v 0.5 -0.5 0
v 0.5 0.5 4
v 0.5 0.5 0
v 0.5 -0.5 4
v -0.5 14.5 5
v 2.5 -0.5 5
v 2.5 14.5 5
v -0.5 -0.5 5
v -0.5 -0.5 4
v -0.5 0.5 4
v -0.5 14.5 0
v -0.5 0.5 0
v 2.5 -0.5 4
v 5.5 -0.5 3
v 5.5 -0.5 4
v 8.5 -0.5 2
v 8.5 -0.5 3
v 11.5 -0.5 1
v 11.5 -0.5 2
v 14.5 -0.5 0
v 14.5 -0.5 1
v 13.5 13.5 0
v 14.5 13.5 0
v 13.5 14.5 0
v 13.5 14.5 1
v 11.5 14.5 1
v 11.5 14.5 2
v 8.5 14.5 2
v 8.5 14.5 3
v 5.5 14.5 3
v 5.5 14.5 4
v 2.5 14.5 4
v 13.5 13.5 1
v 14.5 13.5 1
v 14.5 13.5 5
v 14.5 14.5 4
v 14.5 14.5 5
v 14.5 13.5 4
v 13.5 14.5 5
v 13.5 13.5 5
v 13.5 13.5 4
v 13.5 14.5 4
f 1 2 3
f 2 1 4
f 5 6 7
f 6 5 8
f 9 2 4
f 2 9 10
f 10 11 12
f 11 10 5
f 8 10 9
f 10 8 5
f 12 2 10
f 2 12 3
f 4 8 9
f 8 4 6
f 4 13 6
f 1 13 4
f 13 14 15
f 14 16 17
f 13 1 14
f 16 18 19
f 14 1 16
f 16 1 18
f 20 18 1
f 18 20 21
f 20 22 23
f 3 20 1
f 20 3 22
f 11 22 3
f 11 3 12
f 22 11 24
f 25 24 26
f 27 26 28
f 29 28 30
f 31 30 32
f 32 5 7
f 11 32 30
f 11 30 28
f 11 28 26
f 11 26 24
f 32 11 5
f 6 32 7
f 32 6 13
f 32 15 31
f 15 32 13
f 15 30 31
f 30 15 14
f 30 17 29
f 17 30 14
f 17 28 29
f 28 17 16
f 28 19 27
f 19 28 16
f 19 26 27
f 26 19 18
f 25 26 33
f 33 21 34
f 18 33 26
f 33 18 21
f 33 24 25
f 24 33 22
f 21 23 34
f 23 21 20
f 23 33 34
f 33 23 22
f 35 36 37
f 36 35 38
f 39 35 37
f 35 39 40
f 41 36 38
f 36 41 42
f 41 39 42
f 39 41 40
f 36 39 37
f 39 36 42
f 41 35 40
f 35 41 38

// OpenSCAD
union() {
    translate([0, 0, 4.5]) color([1, 0, 0]) cube([1, 1, 1], center=true);
    translate([0, 1, 2.5]) cube([1, 1, 5], center=true);
    translate([0, 2, 2.5]) cube([1, 1, 5], center=true);
    translate([0, 3, 2.5]) cube([1, 1, 5], center=true);
    translate([0, 4, 2.5]) cube([1, 1, 5], center=true);
    translate([0, 5, 2.5]) cube([1, 1, 5], center=true);
    translate([0, 6, 2.5]) cube([1, 1, 5], center=true);
    translate([0, 7, 2.5]) cube([1, 1, 5], center=true);
    translate([0, 8, 2.5]) cube([1, 1, 5], center=true);
    translate([0, 9, 2.5]) cube([1, 1, 5], center=true);
    translate([0, 10, 2.5]) cube([1, 1, 5], center=true);
    translate([0, 11, 2.5]) cube([1, 1, 5], center=true);
    translate([0, 12, 2.5]) cube([1, 1, 5], center=true);
    translate([0, 13, 2.5]) cube([1, 1, 5], center=true);
    translate([0, 14, 2.5]) cube([1, 1, 5], center=true);
    translate([1, 0, 2.5]) cube([1, 1, 5], center=true);
    translate([1, 1, 2.5]) cube([1, 1, 5], center=true);
    translate([1, 2, 2.5]) cube([1, 1, 5], center=true);
    translate([1, 3, 2.5]) cube([1, 1, 5], center=true);
    translate([1, 4, 2.5]) cube([1, 1, 5], center=true);
    translate([1, 5, 2.5]) cube([1, 1, 5], center=true);
    translate([1, 6, 2.5]) cube([1, 1, 5], center=true);
    translate([1, 7, 2.5]) cube([1, 1, 5], center=true);
    translate([1, 8, 2.5]) cube([1, 1, 5], center=true);
    translate([1, 9, 2.5]) cube([1, 1, 5], center=true);
    translate([1, 10, 2.5]) cube([1, 1, 5], center=true);
    translate([1, 11, 2.5]) cube([1, 1, 5], center=true);
    translate([1, 12, 2.5]) cube([1, 1, 5], center=true);
    translate([1, 13, 2.5]) cube([1, 1, 5], center=true);
    translate([1, 14, 2.5]) cube([1, 1, 5], center=true);
    translate([2, 0, 2.5]) cube([1, 1, 5], center=true);
    translate([2, 1, 2.5]) cube([1, 1, 5], center=true);
    translate([2, 2, 2.5]) cube([1, 1, 5], center=true);
    translate([2, 3, 2.5]) cube([1, 1, 5], center=true);
    translate([2, 4, 2.5]) cube([1, 1, 5], center=true);
    translate([2, 5, 2.5]) cube([1, 1, 5], center=true);
    translate([2, 6, 2.5]) cube([1, 1, 5], center=true);
    translate([2, 7, 2.5]) cube([1, 1, 5], center=true);
    translate([2, 8, 2.5]) cube([1, 1, 5], center=true);
    translate([2, 9, 2.5]) cube([1, 1, 5], center=true);
    translate([2, 10, 2.5]) cube([1, 1, 5], center=true);
    translate([2, 11, 2.5]) cube([1, 1, 5], center=true);
    translate([2, 12, 2.5]) cube([1, 1, 5], center=true);
    translate([2, 13, 2.5]) cube([1, 1, 5], center=true);
    translate([2, 14, 2.5]) cube([1, 1, 5], center=true);
    translate([3, 0, 2.0]) cube([1, 1, 4], center=true);
    translate([3, 1, 2.0]) cube([1, 1, 4], center=true);
    translate([3, 2, 2.0]) cube([1, 1, 4], center=true);
    translate([3, 3, 2.0]) cube([1, 1, 4], center=true);
    translate([3, 4, 2.0]) cube([1, 1, 4], center=true);
    translate([3, 5, 2.0]) cube([1, 1, 4], center=true);
    translate([3, 6, 2.0]) cube([1, 1, 4], center=true);
    translate([3, 7, 2.0]) cube([1, 1, 4], center=true);
    translate([3, 8, 2.0]) cube([1, 1, 4], center=true);
    translate([3, 9, 2.0]) cube([1, 1, 4], center=true);
    translate([3, 10, 2.0]) cube([1, 1, 4], center=true);
    translate([3, 11, 2.0]) cube([1, 1, 4], center=true);
    translate([3, 12, 2.0]) cube([1, 1, 4], center=true);
    translate([3, 13, 2.0]) cube([1, 1, 4], center=true);
    translate([3, 14, 2.0]) cube([1, 1, 4], center=true);
    translate([4, 0, 2.0]) cube([1, 1, 4], center=true);
    translate([4, 1, 2.0]) cube([1, 1, 4], center=true);
    translate([4, 2, 2.0]) cube([1, 1, 4], center=true);
    translate([4, 3, 2.0]) cube([1, 1, 4], center=true);
    translate([4, 4, 2.0]) cube([1, 1, 4], center=true);
    translate([4, 5, 2.0]) cube([1, 1, 4], center=true);
    translate([4, 6, 2.0]) cube([1, 1, 4], center=true);
    translate([4, 7, 2.0]) cube([1, 1, 4], center=true);
    translate([4, 8, 2.0]) cube([1, 1, 4], center=true);
    translate([4, 9, 2.0]) cube([1, 1, 4], center=true);
    translate([4, 10, 2.0]) cube([1, 1, 4], center=true);
    translate([4, 11, 2.0]) cube([1, 1, 4], center=true);
    translate([4, 12, 2.0]) cube([1, 1, 4], center=true);
    translate([4, 13, 2.0]) cube([1, 1, 4], center=true);
    translate([4, 14, 2.0]) cube([1, 1, 4], center=true);
    translate([5, 0, 2.0]) cube([1, 1, 4], center=true);
    translate([5, 1, 2.0]) cube([1, 1, 4], center=true);
    translate([5, 2, 2.0]) cube([1, 1, 4], center=true);
    translate([5, 3, 2.0]) cube([1, 1, 4], center=true);
    translate([5, 4, 2.0]) cube([1, 1, 4], center=true);
    translate([5, 5, 2.0]) cube([1, 1, 4], center=true);
    translate([5, 6, 2.0]) cube([1, 1, 4], center=true);
    translate([5, 7, 2.0]) cube([1, 1, 4], center=true);
    translate([5, 8, 2.0]) cube([1, 1, 4], center=true);
    translate([5, 9, 2.0]) cube([1, 1, 4], center=true);
    translate([5, 10, 2.0]) cube([1, 1, 4], center=true);
    translate([5, 11, 2.0]) cube([1, 1, 4], center=true);
    translate([5, 12, 2.0]) cube([1, 1, 4], center=true);
    translate([5, 13, 2.0]) cube([1, 1, 4], center=true);
    translate([5, 14, 2.0]) cube([1, 1, 4], center=true);
    translate([6, 0, 1.5]) cube([1, 1, 3], center=true);
    translate([6, 1, 1.5]) cube([1, 1, 3], center=true);
    translate([6, 2, 1.5]) cube([1, 1, 3], center=true);
    translate([6, 3, 1.5]) cube([1, 1, 3], center=true);
    translate([6, 4, 1.5]) cube([1, 1, 3], center=true);
    translate([6, 5, 1.5]) cube([1, 1, 3], center=true);
    translate([6, 6, 1.5]) cube([1, 1, 3], center=true);
    translate([6, 7, 1.5]) cube([1, 1, 3], center=true);
    translate([6, 8, 1.5]) cube([1, 1, 3], center=true);
    translate([6, 9, 1.5]) cube([1, 1, 3], center=true);
    translate([6, 10, 1.5]) cube([1, 1, 3], center=true);
    translate([6, 11, 1.5]) cube([1, 1, 3], center=true);
    translate([6, 12, 1.5]) cube([1, 1, 3], center=true);
    translate([6, 13, 1.5]) cube([1, 1, 3], center=true);
    translate([6, 14, 1.5]) cube([1, 1, 3], center=true);
    translate([7, 0, 1.5]) cube([1, 1, 3], center=true);
    translate([7, 1, 1.5]) cube([1, 1, 3], center=true);
    translate([7, 2, 1.5]) cube([1, 1, 3], center=true);
    translate([7, 3, 1.5]) cube([1, 1, 3], center=true);
    translate([7, 4, 1.5]) cube([1, 1, 3], center=true);
    translate([7, 5, 1.5]) cube([1, 1, 3], center=true);
    translate([7, 6, 1.5]) cube([1, 1, 3], center=true);
    translate([7, 7, 1.5]) cube([1, 1, 3], center=true);
    translate([7, 8, 1.5]) cube([1, 1, 3], center=true);
    translate([7, 9, 1.5]) cube([1, 1, 3], center=true);
    translate([7, 10, 1.5]) cube([1, 1, 3], center=true);
    translate([7, 11, 1.5]) cube([1, 1, 3], center=true);
    translate([7, 12, 1.5]) cube([1, 1, 3], center=true);
    translate([7, 13, 1.5]) cube([1, 1, 3], center=true);
    translate([7, 14, 1.5]) cube([1, 1, 3], center=true);
    translate([8, 0, 1.5]) cube([1, 1, 3], center=true);
    translate([8, 1, 1.5]) cube([1, 1, 3], center=true);
    translate([8, 2, 1.5]) cube([1, 1, 3], center=true);
    translate([8, 3, 1.5]) cube([1, 1, 3], center=true);
    translate([8, 4, 1.5]) cube([1, 1, 3], center=true);
    translate([8, 5, 1.5]) cube([1, 1, 3], center=true);
    translate([8, 6, 1.5]) cube([1, 1, 3], center=true);
    translate([8, 7, 1.5]) cube([1, 1, 3], center=true);
    translate([8, 8, 1.5]) cube([1, 1, 3], center=true);
    translate([8, 9, 1.5]) cube([1, 1, 3], center=true);
    translate([8, 10, 1.5]) cube([1, 1, 3], center=true);
    translate([8, 11, 1.5]) cube([1, 1, 3], center=true);
    translate([8, 12, 1.5]) cube([1, 1, 3], center=true);
    translate([8, 13, 1.5]) cube([1, 1, 3], center=true);
    translate([8, 14, 1.5]) cube([1, 1, 3], center=true);
    translate([9, 0, 1.0]) cube([1, 1, 2], center=true);
    translate([9, 1, 1.0]) cube([1, 1, 2], center=true);
    translate([9, 2, 1.0]) cube([1, 1, 2], center=true);
    translate([9, 3, 1.0]) cube([1, 1, 2], center=true);
    translate([9, 4, 1.0]) cube([1, 1, 2], center=true);
    translate([9, 5, 1.0]) cube([1, 1, 2], center=true);
    translate([9, 6, 1.0]) cube([1, 1, 2], center=true);
    translate([9, 7, 1.0]) cube([1, 1, 2], center=true);
    translate([9, 8, 1.0]) cube([1, 1, 2], center=true);
    translate([9, 9, 1.0]) cube([1, 1, 2], center=true);
    translate([9, 10, 1.0]) cube([1, 1, 2], center=true);
    translate([9, 11, 1.0]) cube([1, 1, 2], center=true);
    translate([9, 12, 1.0]) cube([1, 1, 2], center=true);
    translate([9, 13, 1.0]) cube([1, 1, 2], center=true);
    translate([9, 14, 1.0]) cube([1, 1, 2], center=true);
    translate([10, 0, 1.0]) cube([1, 1, 2], center=true);
    translate([10, 1, 1.0]) cube([1, 1, 2], center=true);
    translate([10, 2, 1.0]) cube([1, 1, 2], center=true);
    translate([10, 3, 1.0]) cube([1, 1, 2], center=true);
    translate([10, 4, 1.0]) cube([1, 1, 2], center=true);
    translate([10, 5, 1.0]) cube([1, 1, 2], center=true);
    translate([10, 6, 1.0]) cube([1, 1, 2], center=true);
    translate([10, 7, 1.0]) cube([1, 1, 2], center=true);
    translate([10, 8, 1.0]) cube([1, 1, 2], center=true);
    translate([10, 9, 1.0]) cube([1, 1, 2], center=true);
    translate([10, 10, 1.0]) cube([1, 1, 2], center=true);
    translate([10, 11, 1.0]) cube([1, 1, 2], center=true);
    translate([10, 12, 1.0]) cube([1, 1, 2], center=true);
    translate([10, 13, 1.0]) cube([1, 1, 2], center=true);
    translate([10, 14, 1.0]) cube([1, 1, 2], center=true);
    translate([11, 0, 1.0]) cube([1, 1, 2], center=true);
    translate([11, 1, 1.0]) cube([1, 1, 2], center=true);
    translate([11, 2, 1.0]) cube([1, 1, 2], center=true);
    translate([11, 3, 1.0]) cube([1, 1, 2], center=true);
    translate([11, 4, 1.0]) cube([1, 1, 2], center=true);
    translate([11, 5, 1.0]) cube([1, 1, 2], center=true);
    translate([11, 6, 1.0]) cube([1, 1, 2], center=true);
    translate([11, 7, 1.0]) cube([1, 1, 2], center=true);
    translate([11, 8, 1.0]) cube([1, 1, 2], center=true);
    translate([11, 9, 1.0]) cube([1, 1, 2], center=true);
    translate([11, 10, 1.0]) cube([1, 1, 2], center=true);
    translate([11, 11, 1.0]) cube([1, 1, 2], center=true);
    translate([11, 12, 1.0]) cube([1, 1, 2], center=true);
    translate([11, 13, 1.0]) cube([1, 1, 2], center=true);
    translate([11, 14, 1.0]) cube([1, 1, 2], center=true);
    translate([12, 0, 0.5]) cube([1, 1, 1], center=true);
    translate([12, 1, 0.5]) cube([1, 1, 1], center=true);
    translate([12, 2, 0.5]) cube([1, 1, 1], center=true);
    translate([12, 3, 0.5]) cube([1, 1, 1], center=true);
    translate([12, 4, 0.5]) cube([1, 1, 1], center=true);
    translate([12, 5, 0.5]) cube([1, 1, 1], center=true);
    translate([12, 6, 0.5]) cube([1, 1, 1], center=true);
    translate([12, 7, 0.5]) cube([1, 1, 1], center=true);
    translate([12, 8, 0.5]) cube([1, 1, 1], center=true);
    translate([12, 9, 0.5]) cube([1, 1, 1], center=true);
    translate([12, 10, 0.5]) cube([1, 1, 1], center=true);
    translate([12, 11, 0.5]) cube([1, 1, 1], center=true);
    translate([12, 12, 0.5]) cube([1, 1, 1], center=true);
    translate([12, 13, 0.5]) cube([1, 1, 1], center=true);
    translate([12, 14, 0.5]) cube([1, 1, 1], center=true);
    translate([13, 0, 0.5]) cube([1, 1, 1], center=true);
    translate([13, 1, 0.5]) cube([1, 1, 1], center=true);
    translate([13, 2, 0.5]) cube([1, 1, 1], center=true);
    translate([13, 3, 0.5]) cube([1, 1, 1], center=true);
    translate([13, 4, 0.5]) cube([1, 1, 1], center=true);
    translate([13, 5, 0.5]) cube([1, 1, 1], center=true);
    translate([13, 6, 0.5]) cube([1, 1, 1], center=true);
    translate([13, 7, 0.5]) cube([1, 1, 1], center=true);
    translate([13, 8, 0.5]) cube([1, 1, 1], center=true);
    translate([13, 9, 0.5]) cube([1, 1, 1], center=true);
    translate([13, 10, 0.5]) cube([1, 1, 1], center=true);
    translate([13, 11, 0.5]) cube([1, 1, 1], center=true);
    translate([13, 12, 0.5]) cube([1, 1, 1], center=true);
    translate([13, 13, 0.5]) cube([1, 1, 1], center=true);
    translate([13, 14, 0.5]) cube([1, 1, 1], center=true);
    translate([14, 0, 0.5]) cube([1, 1, 1], center=true);
    translate([14, 1, 0.5]) cube([1, 1, 1], center=true);
    translate([14, 2, 0.5]) cube([1, 1, 1], center=true);
    translate([14, 3, 0.5]) cube([1, 1, 1], center=true);
    translate([14, 4, 0.5]) cube([1, 1, 1], center=true);
    translate([14, 5, 0.5]) cube([1, 1, 1], center=true);
    translate([14, 6, 0.5]) cube([1, 1, 1], center=true);
    translate([14, 7, 0.5]) cube([1, 1, 1], center=true);
    translate([14, 8, 0.5]) cube([1, 1, 1], center=true);
    translate([14, 9, 0.5]) cube([1, 1, 1], center=true);
    translate([14, 10, 0.5]) cube([1, 1, 1], center=true);
    translate([14, 11, 0.5]) cube([1, 1, 1], center=true);
    translate([14, 12, 0.5]) cube([1, 1, 1], center=true);
    translate([14, 13, 0.5]) cube([1, 1, 1], center=true);
    translate([14, 14, 4.5]) color([0, 0, 1]) cube([1, 1, 1], center=true);
}
